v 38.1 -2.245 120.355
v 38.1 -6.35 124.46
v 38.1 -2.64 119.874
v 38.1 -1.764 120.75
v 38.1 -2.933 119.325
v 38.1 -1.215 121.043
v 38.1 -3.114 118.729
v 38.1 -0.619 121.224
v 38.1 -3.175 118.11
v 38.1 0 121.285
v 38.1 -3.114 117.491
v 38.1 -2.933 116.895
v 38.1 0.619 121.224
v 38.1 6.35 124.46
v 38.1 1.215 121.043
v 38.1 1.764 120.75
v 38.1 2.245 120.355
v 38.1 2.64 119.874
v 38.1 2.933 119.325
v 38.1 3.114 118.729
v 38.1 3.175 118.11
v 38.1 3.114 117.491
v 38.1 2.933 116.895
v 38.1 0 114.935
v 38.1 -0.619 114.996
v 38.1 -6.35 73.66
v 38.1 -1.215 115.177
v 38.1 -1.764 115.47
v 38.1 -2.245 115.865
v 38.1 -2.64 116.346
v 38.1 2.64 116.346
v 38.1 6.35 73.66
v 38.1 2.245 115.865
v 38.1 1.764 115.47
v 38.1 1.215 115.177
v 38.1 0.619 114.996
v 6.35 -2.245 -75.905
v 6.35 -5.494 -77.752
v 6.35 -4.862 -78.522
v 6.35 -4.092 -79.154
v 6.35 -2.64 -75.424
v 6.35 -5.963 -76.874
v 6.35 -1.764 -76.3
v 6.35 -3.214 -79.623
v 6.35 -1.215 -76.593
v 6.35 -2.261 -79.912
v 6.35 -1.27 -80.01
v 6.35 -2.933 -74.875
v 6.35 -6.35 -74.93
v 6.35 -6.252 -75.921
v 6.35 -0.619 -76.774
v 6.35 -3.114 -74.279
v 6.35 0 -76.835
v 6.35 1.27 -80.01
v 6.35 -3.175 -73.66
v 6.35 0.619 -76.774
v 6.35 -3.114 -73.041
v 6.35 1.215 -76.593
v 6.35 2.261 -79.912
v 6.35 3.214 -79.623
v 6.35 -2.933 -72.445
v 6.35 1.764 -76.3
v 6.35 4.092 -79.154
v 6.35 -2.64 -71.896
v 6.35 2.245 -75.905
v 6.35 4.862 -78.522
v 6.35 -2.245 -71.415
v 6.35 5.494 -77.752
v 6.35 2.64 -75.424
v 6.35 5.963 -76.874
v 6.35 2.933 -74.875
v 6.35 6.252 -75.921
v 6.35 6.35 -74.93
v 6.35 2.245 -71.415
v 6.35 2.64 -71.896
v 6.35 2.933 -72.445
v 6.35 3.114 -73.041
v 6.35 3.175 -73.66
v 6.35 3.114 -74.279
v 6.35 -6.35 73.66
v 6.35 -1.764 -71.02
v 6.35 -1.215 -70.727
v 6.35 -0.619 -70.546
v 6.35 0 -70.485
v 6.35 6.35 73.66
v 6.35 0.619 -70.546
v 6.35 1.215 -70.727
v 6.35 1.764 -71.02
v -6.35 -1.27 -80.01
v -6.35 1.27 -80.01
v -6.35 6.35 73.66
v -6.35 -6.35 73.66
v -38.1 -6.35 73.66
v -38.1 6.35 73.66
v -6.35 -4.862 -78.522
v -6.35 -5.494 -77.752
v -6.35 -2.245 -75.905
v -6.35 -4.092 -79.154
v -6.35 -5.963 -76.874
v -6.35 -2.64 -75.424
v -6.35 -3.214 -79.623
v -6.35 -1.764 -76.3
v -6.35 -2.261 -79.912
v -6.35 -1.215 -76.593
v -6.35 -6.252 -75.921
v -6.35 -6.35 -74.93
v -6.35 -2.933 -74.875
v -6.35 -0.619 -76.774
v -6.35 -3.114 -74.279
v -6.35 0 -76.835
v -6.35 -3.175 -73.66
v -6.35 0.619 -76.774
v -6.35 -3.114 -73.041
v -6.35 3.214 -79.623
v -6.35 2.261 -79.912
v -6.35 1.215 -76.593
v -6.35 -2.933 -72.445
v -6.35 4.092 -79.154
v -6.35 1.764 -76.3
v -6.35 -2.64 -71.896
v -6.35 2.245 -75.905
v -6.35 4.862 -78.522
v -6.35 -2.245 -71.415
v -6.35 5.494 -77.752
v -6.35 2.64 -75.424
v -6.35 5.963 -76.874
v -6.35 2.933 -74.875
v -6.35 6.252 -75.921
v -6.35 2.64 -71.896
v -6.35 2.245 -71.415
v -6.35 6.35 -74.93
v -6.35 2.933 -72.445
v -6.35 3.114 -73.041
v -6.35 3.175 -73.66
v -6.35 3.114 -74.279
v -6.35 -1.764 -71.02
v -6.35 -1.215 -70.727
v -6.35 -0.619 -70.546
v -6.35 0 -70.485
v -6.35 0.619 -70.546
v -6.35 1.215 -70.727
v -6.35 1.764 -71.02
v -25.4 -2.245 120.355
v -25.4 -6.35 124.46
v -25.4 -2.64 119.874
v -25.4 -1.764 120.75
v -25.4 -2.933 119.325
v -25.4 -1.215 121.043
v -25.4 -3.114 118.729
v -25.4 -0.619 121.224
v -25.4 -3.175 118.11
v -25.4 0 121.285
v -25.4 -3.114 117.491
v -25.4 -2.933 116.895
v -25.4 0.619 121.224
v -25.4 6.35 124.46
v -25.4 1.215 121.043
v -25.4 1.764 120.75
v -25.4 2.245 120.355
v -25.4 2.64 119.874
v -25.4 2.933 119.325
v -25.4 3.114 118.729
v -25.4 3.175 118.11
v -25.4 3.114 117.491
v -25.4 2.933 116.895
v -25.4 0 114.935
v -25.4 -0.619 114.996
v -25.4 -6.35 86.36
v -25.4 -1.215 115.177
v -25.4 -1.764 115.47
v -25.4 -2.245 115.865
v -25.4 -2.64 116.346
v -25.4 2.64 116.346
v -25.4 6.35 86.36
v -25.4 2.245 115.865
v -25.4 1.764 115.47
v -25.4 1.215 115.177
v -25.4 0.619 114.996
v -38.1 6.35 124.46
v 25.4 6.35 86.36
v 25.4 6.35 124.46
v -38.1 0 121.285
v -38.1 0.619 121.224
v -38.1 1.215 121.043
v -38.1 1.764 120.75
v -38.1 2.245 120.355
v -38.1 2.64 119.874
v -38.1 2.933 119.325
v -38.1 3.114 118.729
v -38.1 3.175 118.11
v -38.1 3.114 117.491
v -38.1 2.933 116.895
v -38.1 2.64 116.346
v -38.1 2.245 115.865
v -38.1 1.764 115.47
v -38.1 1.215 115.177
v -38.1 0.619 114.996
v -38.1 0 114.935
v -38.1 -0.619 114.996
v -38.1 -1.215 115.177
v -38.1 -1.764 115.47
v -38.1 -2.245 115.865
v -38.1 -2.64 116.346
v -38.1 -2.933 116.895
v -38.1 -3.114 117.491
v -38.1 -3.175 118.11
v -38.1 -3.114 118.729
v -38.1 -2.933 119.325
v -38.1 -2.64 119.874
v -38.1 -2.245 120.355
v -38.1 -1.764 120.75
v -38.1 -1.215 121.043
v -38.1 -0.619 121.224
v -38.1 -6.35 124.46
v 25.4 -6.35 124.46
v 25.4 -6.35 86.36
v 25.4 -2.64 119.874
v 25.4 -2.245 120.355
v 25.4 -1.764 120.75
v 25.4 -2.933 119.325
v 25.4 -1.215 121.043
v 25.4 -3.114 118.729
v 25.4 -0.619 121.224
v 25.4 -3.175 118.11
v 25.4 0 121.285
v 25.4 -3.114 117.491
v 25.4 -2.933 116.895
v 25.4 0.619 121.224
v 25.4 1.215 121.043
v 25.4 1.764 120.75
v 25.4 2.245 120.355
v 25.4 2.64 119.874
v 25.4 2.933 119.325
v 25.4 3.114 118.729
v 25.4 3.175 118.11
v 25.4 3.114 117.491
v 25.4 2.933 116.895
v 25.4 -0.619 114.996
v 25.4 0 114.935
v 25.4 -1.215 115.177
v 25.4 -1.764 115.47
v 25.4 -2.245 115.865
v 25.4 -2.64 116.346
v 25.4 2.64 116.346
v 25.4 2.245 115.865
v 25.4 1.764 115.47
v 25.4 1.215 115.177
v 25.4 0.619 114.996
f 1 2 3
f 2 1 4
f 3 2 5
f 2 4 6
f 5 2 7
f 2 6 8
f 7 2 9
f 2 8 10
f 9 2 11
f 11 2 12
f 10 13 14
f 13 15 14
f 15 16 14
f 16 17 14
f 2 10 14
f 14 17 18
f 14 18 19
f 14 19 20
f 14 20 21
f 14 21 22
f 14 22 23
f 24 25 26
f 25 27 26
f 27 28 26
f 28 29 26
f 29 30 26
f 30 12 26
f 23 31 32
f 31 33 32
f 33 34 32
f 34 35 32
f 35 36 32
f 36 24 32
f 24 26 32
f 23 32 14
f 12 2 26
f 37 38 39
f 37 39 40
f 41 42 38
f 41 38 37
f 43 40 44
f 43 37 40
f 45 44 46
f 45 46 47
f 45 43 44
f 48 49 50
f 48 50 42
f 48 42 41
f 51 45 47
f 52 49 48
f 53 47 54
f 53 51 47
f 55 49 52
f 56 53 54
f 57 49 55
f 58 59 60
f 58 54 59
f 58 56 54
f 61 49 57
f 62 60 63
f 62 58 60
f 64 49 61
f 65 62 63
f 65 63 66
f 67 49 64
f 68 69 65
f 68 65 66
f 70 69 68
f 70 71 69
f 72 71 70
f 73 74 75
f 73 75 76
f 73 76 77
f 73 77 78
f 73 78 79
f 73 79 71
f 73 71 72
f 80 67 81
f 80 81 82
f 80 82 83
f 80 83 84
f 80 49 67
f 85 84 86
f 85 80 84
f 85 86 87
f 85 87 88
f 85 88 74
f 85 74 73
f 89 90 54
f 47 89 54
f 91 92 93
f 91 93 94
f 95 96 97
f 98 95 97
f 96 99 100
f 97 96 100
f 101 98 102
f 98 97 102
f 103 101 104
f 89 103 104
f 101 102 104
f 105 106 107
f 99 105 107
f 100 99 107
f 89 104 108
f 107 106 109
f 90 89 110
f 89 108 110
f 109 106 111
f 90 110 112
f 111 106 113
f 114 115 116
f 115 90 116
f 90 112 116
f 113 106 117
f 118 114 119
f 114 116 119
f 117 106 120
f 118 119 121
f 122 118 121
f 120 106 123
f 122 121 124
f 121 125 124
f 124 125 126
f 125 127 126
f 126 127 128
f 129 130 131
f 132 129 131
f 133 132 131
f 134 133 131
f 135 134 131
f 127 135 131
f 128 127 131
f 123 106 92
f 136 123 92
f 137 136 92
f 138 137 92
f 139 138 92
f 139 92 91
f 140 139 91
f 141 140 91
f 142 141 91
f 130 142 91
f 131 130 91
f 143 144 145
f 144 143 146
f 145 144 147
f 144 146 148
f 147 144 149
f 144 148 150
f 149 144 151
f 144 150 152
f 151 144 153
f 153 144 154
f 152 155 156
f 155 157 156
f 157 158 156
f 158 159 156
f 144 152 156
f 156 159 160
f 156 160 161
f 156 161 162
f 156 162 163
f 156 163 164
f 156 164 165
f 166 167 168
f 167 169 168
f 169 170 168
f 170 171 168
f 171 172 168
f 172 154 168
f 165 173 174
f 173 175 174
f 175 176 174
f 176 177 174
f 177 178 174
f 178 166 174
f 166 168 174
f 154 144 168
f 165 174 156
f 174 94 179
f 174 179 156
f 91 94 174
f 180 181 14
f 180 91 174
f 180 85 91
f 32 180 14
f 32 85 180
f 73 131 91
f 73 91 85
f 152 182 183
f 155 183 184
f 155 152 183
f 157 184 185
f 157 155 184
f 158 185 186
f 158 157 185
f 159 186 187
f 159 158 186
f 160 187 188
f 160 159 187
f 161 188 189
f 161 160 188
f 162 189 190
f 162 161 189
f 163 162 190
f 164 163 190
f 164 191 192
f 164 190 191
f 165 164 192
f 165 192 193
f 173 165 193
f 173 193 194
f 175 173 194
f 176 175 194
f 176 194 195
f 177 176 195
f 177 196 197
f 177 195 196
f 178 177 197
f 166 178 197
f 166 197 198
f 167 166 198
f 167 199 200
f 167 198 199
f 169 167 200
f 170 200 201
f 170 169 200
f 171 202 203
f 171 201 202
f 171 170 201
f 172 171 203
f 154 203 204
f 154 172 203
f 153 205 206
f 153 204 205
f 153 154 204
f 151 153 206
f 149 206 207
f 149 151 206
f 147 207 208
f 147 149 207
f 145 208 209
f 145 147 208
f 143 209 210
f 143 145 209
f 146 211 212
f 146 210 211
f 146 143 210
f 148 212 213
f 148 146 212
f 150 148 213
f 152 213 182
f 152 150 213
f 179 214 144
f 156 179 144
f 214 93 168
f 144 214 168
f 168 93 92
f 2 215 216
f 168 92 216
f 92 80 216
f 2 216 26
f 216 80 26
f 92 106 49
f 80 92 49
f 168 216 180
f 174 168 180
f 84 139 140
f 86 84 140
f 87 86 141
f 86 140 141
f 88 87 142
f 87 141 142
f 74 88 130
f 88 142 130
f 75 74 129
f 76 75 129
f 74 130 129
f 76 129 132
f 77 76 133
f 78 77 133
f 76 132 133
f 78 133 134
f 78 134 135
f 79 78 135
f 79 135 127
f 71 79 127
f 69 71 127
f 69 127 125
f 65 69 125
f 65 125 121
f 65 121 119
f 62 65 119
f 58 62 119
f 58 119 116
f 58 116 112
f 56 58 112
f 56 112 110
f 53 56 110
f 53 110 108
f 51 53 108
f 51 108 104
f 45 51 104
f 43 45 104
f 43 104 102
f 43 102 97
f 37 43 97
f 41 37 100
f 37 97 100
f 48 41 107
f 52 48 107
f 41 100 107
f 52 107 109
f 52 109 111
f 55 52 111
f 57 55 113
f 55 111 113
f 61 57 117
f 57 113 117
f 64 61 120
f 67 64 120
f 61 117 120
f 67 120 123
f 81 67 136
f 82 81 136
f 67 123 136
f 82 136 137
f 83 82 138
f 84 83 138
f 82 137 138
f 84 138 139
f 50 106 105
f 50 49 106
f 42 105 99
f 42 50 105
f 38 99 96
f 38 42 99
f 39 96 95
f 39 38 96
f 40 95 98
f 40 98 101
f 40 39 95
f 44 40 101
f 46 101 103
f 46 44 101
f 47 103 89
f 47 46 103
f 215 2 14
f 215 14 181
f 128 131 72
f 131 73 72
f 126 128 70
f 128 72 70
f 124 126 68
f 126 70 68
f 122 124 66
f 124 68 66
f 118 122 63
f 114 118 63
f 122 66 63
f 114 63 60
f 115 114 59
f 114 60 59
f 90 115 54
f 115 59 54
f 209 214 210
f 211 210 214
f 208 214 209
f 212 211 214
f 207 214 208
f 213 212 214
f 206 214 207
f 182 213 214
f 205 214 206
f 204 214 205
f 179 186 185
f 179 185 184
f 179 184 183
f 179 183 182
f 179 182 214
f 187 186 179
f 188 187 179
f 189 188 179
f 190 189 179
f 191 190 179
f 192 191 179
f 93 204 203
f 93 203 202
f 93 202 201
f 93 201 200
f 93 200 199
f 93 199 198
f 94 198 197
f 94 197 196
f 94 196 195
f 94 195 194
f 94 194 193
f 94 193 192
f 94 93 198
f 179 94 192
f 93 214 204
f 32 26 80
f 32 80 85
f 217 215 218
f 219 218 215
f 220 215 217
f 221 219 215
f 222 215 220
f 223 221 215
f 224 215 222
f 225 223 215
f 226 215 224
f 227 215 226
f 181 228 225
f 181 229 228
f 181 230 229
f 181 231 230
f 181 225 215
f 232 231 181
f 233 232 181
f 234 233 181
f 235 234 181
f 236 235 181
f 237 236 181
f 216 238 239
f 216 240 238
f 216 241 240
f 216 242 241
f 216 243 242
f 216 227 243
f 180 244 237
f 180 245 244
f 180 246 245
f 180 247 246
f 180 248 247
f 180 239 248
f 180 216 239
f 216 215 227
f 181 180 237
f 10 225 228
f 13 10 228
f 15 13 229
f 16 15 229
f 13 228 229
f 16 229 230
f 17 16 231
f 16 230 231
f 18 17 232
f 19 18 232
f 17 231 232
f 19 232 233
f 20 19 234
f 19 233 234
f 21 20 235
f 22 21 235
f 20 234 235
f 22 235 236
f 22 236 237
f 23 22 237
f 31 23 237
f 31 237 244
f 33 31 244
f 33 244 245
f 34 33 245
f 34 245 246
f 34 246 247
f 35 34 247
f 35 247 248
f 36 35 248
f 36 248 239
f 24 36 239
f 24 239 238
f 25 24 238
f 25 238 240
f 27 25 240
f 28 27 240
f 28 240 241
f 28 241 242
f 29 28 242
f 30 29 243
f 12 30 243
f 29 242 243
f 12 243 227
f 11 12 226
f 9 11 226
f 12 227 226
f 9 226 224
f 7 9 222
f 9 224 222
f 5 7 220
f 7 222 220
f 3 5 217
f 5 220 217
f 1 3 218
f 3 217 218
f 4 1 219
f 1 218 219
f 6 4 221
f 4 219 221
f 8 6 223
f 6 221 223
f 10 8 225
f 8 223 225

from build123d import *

# Parameters (mm, degrees)
SKETCH1_W                = 12.7
SKETCH1_H                = 12.7
BOSS_EXTRUDE1_DEPTH      = 86.36
BOSS_EXTRUDE1_DEPTH_BACK = 80.01
SKETCH4_W                = 12.7
SKETCH4_H                = 12.7
BOSS_EXTRUDE2_DEPTH      = 38.1
SKETCH5_W                = 12.7
SKETCH5_H                = 12.7
BOSS_EXTRUDE3_DEPTH      = 50.8
SKETCH6_R                = 3.175
CUT_EXTRUDE1_DEPTH       = 16.51
SKETCH7_R                = 3.175
CUT_EXTRUDE2_DEPTH       = 45.45
FILLET1_R                = 5.08


with BuildPart() as part:
    # Sketch1 → Boss-Extrude1 (new body, two sides)
    with BuildSketch(Plane.XY) as boss_extrude1_sk:
        Rectangle(SKETCH1_W, SKETCH1_H)
    extrude(amount=BOSS_EXTRUDE1_DEPTH)
    extrude(boss_extrude1_sk.sketch, amount=-BOSS_EXTRUDE1_DEPTH_BACK)

    # Sketch4 → Boss-Extrude2 (add, symmetric)
    with BuildSketch(Plane(origin=(0, 0, 0), x_dir=(0, 0, -1), z_dir=(1, 0, 0))):
        with Locations((-80.01, 0)):
            Rectangle(SKETCH4_W, SKETCH4_H)
    extrude(amount=BOSS_EXTRUDE2_DEPTH, both=True)

    # Sketch5 → Boss-Extrude3 (add)
    with BuildSketch(Plane(origin=(0, 0, 73.66), x_dir=(-1, 0, 0), z_dir=(0, 0, -1))):
        with Locations((-31.75, 0)):
            Rectangle(SKETCH5_W, SKETCH5_H)
    boss_extrude3 = extrude(amount=-BOSS_EXTRUDE3_DEPTH)

    # Sketch6 → Cut-Extrude1 (cut)
    with BuildSketch(Plane.ZY.offset(-25.4)):
        with Locations((118.11, 0)):
            Circle(SKETCH6_R)
    cut_extrude1 = extrude(amount=-CUT_EXTRUDE1_DEPTH, mode=Mode.SUBTRACT)

    # Mirror1: Boss-Extrude3, Cut-Extrude1 across plane
    add(boss_extrude3.mirror(Plane(origin=(0, 0, 0), x_dir=(0, 0, 1), z_dir=(1, 0, 0))))
    add(cut_extrude1.mirror(Plane(origin=(0, 0, 0), x_dir=(0, 0, 1), z_dir=(1, 0, 0))), mode=Mode.SUBTRACT)

    # Sketch7 → Cut-Extrude2 (cut, through all)
    with BuildSketch(Plane.ZY.offset(6.35)):
        with Locations((-73.66, 0)):
            Circle(SKETCH7_R)
    extrude(amount=-CUT_EXTRUDE2_DEPTH, mode=Mode.SUBTRACT)

    # Fillet1
    fillet1_edges = [part.edges().sort_by_distance(p)[0] for p in [
        (0, 6.35, -80.01),
        (0, -6.35, -80.01),
    ]]
    fillet(fillet1_edges, radius=FILLET1_R)


solid = part.part
